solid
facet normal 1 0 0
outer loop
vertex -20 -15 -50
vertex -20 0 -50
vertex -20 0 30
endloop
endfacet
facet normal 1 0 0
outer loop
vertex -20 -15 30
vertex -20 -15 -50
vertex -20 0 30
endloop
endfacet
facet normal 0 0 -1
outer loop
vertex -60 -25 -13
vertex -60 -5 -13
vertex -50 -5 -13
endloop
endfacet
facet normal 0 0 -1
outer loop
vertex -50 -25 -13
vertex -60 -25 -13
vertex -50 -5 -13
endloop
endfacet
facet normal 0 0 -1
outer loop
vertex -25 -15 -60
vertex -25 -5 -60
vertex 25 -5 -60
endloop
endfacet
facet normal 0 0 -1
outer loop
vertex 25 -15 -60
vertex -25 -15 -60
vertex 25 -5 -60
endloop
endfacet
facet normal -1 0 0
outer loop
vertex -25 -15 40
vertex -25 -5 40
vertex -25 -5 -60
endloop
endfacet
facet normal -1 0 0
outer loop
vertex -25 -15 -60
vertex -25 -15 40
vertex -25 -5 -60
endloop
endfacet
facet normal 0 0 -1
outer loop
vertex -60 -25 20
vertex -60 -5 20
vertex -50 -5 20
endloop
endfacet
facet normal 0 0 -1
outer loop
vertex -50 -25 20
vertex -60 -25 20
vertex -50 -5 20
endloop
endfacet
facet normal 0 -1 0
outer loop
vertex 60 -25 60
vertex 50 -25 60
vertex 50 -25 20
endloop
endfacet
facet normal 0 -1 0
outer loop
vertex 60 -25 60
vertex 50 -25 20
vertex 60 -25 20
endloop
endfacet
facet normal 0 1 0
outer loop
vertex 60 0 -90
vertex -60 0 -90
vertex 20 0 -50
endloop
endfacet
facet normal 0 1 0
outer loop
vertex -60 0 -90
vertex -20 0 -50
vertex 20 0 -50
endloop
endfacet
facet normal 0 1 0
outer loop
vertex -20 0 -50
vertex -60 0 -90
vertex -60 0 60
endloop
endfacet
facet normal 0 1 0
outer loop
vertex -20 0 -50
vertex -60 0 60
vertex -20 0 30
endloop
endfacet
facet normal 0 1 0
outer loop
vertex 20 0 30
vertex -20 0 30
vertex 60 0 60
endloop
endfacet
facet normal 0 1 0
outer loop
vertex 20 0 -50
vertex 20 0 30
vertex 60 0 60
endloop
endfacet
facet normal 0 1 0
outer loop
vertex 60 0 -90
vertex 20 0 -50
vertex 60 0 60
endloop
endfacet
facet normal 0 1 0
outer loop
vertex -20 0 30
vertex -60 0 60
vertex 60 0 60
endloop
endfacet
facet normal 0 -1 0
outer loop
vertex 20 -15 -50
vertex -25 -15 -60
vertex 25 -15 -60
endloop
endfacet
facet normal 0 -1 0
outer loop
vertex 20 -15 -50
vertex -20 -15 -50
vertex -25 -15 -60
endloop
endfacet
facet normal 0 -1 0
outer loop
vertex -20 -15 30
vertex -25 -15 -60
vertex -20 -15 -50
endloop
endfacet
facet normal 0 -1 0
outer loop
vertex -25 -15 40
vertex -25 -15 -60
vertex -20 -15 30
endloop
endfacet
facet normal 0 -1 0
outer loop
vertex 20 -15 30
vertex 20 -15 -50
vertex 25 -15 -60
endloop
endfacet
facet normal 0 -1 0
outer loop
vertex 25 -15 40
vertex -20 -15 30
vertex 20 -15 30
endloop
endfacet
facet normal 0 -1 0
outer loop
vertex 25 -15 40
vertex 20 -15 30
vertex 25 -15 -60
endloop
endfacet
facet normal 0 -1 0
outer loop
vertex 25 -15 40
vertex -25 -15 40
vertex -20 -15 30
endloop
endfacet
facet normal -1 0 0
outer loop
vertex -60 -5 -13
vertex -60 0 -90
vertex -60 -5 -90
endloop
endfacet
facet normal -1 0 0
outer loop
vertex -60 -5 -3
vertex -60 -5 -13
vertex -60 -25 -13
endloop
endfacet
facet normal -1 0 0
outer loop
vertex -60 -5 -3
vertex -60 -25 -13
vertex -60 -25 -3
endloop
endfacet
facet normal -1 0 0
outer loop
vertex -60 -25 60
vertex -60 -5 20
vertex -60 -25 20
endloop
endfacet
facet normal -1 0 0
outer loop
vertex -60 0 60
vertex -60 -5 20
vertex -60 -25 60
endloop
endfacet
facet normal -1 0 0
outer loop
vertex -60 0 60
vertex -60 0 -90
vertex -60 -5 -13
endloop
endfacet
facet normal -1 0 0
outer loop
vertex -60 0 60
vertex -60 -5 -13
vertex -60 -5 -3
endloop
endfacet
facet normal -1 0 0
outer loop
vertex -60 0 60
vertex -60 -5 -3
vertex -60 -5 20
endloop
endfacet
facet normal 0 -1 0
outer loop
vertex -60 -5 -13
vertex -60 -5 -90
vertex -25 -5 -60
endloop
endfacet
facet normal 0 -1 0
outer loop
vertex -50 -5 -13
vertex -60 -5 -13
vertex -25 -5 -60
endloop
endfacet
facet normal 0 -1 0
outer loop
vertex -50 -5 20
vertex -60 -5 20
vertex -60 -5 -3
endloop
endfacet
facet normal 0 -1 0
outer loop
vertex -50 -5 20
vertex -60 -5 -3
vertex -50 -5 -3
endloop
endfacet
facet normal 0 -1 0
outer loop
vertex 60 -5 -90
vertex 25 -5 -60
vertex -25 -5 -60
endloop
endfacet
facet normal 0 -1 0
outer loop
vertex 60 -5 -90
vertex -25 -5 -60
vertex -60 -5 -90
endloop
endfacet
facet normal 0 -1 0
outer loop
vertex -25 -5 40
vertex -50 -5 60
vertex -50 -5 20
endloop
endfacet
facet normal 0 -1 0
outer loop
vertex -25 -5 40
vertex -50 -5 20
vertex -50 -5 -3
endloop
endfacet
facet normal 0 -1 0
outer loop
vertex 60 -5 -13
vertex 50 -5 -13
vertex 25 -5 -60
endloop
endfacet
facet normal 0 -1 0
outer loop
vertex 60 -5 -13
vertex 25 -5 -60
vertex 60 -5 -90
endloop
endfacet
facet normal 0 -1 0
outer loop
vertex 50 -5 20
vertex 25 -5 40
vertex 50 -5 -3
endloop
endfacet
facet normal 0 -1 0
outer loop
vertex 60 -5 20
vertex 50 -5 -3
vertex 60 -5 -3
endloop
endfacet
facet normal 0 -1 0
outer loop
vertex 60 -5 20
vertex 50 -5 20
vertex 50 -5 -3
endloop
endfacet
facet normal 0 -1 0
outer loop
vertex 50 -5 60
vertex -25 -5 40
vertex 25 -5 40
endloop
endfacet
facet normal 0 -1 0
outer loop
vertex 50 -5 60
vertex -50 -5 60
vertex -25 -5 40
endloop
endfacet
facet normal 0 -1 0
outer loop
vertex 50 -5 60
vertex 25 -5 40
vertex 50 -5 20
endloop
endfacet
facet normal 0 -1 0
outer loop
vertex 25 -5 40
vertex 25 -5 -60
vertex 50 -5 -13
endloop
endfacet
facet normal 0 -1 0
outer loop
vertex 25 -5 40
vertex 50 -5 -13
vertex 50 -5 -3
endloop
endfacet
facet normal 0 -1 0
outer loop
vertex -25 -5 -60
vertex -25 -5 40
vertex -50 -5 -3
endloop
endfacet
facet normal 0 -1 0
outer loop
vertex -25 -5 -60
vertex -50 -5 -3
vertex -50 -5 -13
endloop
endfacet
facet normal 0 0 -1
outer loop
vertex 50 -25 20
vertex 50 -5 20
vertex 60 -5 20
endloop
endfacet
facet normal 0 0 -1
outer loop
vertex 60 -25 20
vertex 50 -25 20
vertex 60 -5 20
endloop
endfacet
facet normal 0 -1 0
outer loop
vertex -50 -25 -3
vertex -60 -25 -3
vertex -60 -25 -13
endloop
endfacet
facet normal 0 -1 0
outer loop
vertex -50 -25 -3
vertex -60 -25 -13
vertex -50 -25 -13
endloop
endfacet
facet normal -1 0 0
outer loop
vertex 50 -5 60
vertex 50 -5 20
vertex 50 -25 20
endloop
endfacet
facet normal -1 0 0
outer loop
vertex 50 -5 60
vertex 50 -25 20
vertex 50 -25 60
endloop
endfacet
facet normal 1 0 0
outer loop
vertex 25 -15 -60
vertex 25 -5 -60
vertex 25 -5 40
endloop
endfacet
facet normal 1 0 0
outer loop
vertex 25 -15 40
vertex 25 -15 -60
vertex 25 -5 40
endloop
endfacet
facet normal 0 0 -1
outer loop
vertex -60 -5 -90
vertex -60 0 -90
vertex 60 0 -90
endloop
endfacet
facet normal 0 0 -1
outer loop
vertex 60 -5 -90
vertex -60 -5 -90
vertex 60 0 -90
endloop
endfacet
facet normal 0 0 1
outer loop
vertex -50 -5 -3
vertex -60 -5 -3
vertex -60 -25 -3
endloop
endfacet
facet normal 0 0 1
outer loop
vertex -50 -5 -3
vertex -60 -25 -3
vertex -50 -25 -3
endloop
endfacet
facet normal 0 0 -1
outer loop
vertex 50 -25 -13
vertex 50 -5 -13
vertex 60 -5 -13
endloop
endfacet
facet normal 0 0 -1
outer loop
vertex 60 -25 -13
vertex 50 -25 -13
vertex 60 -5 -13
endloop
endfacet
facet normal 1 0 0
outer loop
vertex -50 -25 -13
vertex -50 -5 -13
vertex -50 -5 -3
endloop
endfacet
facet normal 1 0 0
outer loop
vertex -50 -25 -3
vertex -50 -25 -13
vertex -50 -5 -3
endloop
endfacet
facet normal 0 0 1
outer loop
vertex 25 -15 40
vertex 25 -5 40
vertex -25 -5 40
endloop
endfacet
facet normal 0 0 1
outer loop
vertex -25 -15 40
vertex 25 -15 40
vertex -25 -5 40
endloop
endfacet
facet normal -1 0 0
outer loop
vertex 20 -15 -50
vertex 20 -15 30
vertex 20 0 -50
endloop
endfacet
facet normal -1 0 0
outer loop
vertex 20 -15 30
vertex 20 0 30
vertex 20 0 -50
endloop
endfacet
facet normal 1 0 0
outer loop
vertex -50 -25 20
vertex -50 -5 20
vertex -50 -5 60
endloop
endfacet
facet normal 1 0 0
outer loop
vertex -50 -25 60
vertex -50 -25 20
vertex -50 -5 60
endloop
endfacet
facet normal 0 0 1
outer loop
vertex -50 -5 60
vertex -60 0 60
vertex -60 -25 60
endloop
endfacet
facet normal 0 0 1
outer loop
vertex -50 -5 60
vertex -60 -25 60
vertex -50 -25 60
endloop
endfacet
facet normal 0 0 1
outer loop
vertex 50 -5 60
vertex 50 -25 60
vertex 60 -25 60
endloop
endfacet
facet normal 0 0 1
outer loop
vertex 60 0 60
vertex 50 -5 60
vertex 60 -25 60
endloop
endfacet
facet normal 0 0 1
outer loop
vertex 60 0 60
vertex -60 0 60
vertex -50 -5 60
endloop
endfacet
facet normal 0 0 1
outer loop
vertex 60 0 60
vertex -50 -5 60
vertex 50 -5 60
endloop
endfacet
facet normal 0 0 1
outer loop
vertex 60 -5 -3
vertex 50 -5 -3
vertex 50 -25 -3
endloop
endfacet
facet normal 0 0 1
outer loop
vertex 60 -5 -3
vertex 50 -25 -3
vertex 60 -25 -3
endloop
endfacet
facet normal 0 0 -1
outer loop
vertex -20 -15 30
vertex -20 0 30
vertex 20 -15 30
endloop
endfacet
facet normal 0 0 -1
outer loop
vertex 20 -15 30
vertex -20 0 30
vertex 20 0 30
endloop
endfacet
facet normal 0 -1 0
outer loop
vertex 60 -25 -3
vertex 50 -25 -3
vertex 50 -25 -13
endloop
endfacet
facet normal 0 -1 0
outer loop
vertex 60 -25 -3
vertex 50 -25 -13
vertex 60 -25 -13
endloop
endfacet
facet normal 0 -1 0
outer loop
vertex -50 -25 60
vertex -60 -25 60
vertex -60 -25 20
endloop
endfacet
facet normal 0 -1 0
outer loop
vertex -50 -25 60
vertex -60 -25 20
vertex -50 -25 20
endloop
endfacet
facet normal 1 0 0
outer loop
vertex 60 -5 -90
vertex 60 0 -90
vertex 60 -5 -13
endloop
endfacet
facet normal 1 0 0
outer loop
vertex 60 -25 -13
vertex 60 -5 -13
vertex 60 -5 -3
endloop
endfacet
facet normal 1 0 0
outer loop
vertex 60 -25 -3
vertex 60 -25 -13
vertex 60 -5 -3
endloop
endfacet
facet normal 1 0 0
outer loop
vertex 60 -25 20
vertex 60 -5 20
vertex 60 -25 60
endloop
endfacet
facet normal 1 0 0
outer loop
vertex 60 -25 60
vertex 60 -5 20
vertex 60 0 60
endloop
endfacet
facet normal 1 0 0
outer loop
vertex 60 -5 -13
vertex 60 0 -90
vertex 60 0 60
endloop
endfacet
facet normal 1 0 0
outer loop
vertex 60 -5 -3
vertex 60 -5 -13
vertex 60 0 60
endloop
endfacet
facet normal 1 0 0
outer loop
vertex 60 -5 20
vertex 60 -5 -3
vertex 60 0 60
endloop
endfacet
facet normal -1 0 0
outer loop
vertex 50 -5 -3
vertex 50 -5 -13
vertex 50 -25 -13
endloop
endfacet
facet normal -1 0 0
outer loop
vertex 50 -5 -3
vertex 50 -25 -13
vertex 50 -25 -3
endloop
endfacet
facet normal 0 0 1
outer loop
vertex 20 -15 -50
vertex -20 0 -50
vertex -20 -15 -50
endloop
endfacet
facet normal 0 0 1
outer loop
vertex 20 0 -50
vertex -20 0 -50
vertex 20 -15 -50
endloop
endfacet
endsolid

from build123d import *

# Parameters (mm, degrees)
F0_W     = 120
F0_H     = 150
F1_DEPTH = 5
F2_W     = 40
F2_H     = 80
F3_DEPTH = 5.001
F4_W     = 10
F4_H     = 40
F4_H_2   = 10
F5_DEPTH = 20
F6_W     = 40
F6_H     = 10
F7_DEPTH = 10


with BuildPart() as f1:
    # F0 (on Front) → F1 (new body)
    with BuildSketch(Plane.XZ):
        with Locations((0, -15)):
            Rectangle(F0_W, F0_H)
    extrude(amount=F1_DEPTH)

    # F2 (on face) → F3 (cut, through all)
    with BuildSketch(Plane.XZ.offset(5)):
        with Locations((0, -10)):
            Rectangle(F2_W, F2_H)
    extrude(amount=-F3_DEPTH, mode=Mode.SUBTRACT)

    # F4 (on face) → F5 (join)
    with BuildSketch(Plane.XZ.offset(5)):
        with Locations((-55, 40)):
            Rectangle(F4_W, F4_H)
        with Locations((-55, -8)):
            Rectangle(F4_W, F4_H_2)
        with Locations((55, 40)):
            Rectangle(F4_W, F4_H)
        with Locations((55, -8)):
            Rectangle(F4_W, F4_H_2)
    extrude(amount=F5_DEPTH)

    # F6 (on face) → F7 (join)
    with BuildSketch(Plane.XZ.offset(5)):
        with Locations((0, 35)):
            Rectangle(F6_W, F6_H)
        Polygon((-20, -50), (-20, 30), (-20, 40), (-25, 40), (-25, -60), (-20, -60), align=None)
        Polygon((20, 40), (20, 30), (20, -50), (20, -60), (25, -60), (25, 40), align=None)
        with Locations((0, -55)):
            Rectangle(F6_W, F6_H)
    extrude(amount=F7_DEPTH)


solid = f1.part
